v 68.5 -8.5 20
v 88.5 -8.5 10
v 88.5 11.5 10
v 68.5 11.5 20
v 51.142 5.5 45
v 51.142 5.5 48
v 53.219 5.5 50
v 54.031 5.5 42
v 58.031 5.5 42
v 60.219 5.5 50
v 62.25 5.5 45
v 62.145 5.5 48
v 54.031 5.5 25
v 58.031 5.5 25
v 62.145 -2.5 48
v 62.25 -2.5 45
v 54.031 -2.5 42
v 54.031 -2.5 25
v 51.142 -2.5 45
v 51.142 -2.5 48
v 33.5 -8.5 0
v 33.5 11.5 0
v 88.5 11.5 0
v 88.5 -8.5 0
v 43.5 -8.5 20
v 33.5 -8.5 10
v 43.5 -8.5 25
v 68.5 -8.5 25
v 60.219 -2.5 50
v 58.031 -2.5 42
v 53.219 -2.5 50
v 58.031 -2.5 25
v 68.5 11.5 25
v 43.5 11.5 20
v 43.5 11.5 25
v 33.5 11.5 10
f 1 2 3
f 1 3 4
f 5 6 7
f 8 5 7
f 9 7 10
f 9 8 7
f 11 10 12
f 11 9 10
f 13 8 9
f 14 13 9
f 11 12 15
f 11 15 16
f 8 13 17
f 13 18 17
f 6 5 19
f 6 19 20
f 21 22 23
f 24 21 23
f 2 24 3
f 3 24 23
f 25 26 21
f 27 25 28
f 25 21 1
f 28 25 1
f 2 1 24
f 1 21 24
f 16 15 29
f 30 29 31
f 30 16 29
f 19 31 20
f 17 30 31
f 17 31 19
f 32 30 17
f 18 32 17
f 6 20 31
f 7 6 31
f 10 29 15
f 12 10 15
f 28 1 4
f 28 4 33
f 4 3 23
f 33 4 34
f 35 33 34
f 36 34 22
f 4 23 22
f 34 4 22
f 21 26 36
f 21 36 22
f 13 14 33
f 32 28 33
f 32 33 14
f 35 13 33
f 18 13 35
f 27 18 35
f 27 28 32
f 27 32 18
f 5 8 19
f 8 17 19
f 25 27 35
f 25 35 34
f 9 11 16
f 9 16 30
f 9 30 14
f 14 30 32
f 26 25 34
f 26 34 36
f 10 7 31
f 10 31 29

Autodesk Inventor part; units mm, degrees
ref_plane "YZ Plane" through (0, 0, 0) normal (1, 0, 0) x (0, 1, 0)
ref_plane "XZ Plane" through (0, 0, 0) normal (0, 1, 0) x (-1, 0, 0)
ref_plane "XY Plane" through (0, 0, 0) normal (0, 0, 1) x (1, 0, 0)
sketch "Эскиз1" plane through (0, 0, 0) normal (0, 0, 1) x (1, 0, 0)
  arc A0 (113.5, 24) -> (93.5, 4) centre (113.5, 4) ccw projected
  arc A1 (93.5, -1) -> (113.5, -21) centre (113.5, -1) ccw projected
  line L0 (93.5, 4) -> (93.5, -1) projected
  line L1 (88.5, 11.5) -> (28.5, 11.5)
  line L2 (28.5, 11.5) -> (28.5, -8.5)
  line L3 (28.5, -8.5) -> (88.5, -8.5)
  line L4 (88.5, -8.5) -> (88.5, 11.5)
  line L5 (-123.5, 102) -> (-123.5, -102) projected
  line L6 (-123.5, -102) -> (123.5, -102) projected
  line L7 (123.5, -102) -> (123.5, -100.4305) projected
  line L8 (123.5, -100.4305) -> (123.5, 102) projected
  line L9 (123.5, 102) -> (-123.5, 102) projected
  point P0 (0, 0)
  point P1 (88.5, 1.5)
  point P2 (93.5, 1.5)
  dimension "d0" = 20
  dimension "d1" = 60
  dimension "d2" = 5
extrude "Выдавливание1" add sketch "Эскиз1" along normal blind 30 contours L4 L3 L2 L1
sketch "Эскиз2" plane through (28.5, -8.5, 0) normal (0, -1, 0) x (1, 0, 0)
  line L0 (0, 0) -> (60, 0) projected
  line L1 (60, 0) -> (60, 3.0763)
  line L2 (60, 3.0763) -> (60, 10)
  line L3 (60, 10) -> (40, 20)
  line L4 (40, 20) -> (40, 25)
  line L5 (40, 25) -> (15, 25)
  line L6 (15, 25) -> (15, 20)
  line L7 (15, 20) -> (5, 10)
  line L8 (5, 10) -> (5, 0)
  line L9 (60, 0) -> (60, 30) projected
  point P0 (-28.5, 0)
  dimension "d6" = 25
  dimension "d7" = 5
  dimension "d8" = 5
  dimension "d9" = 20
  dimension "d10" = 10
  dimension "d11" = 10
  dimension "d12" = 10
  dimension "d13" = 25
extrude "Выдавливание2" cut sketch "Эскиз2" against normal blind 30 keep common part
sketch "Эскиз3" plane through (43.5, -8.5, 25) normal (0, 0, 1) x (1, 0, 0)
  line L0 (5, 14) -> (20, 14)
  line L1 (20, 14) -> (20, 6)
  line L2 (20, 6) -> (5, 6)
  line L3 (5, 6) -> (5, 14)
  line L4 (25, 20) -> (0, 20) projected
  line L5 (0, 0) -> (0, 20) projected
  point P0 (-43.5, 8.5)
  dimension "d16" = 8
  dimension "d17" = 15
  dimension "d18" = 6
  dimension "d19" = 25
  dimension "d20" = 20
  dimension "d21" = 5
extrude "Выдавливание3" add sketch "Эскиз3" along normal blind 25
sketch "Эскиз4" plane through (48.5, -2.5, 25) normal (0, -1, 0) x (1, 0, 0)
  line L0 (15, 0) -> (0, 0) projected
  line L1 (5.5312, 0) -> (5.5312, 17)
  line L2 (5.5312, 17) -> (2.6422, 20)
  line L3 (2.6422, 20) -> (2.6422, 23)
  line L4 (2.6422, 23) -> (4.719, 25)
  line L5 (4.719, 25) -> (11.719, 25)
  line L6 (0, 25) -> (15, 25) projected
  line L7 (11.719, 25) -> (13.645, 23)
  line L8 (13.645, 23) -> (13.7498, 20)
  line L9 (13.7498, 20) -> (9.5312, 17)
  line L10 (9.5312, 17) -> (9.5312, 0)
  line L11 (-5, 0) -> (20, 0) projected
  line L12 (0, 0) -> (0, 25) projected
  line L13 (5.5312, 0) -> (9.5312, 0)
  line L14 (20, -5) -> (40, -15) projected
  line L15 (20, 0) -> (20, -5) projected
  line L16 (-5, 0) -> (20, 0) projected
  line L17 (-5, -5) -> (-5, 0) projected
  line L18 (-15, -15) -> (-5, -5) projected
  line L19 (-15, -25) -> (-15, -15) projected
  line L20 (-15, -25) -> (40, -25) projected
  line L21 (40, -25) -> (40, -15) projected
  point P0 (-48.5, -25)
  point P1 (9.5312, 0)
  dimension "d24" = 2
  dimension "d25" = 7
  dimension "d26" = 17
  dimension "d27" = 17
  dimension "d28" = 3
  dimension "d29" = 3
  dimension "d30" = 3
  dimension "d31" = 3
  dimension "d32" = 2
  dimension "d33" = 4
  dimension "d34" = 11.1076
  dimension "d35" = 2.6422
extrude "Выдавливание4" cut sketch "Эскиз4" against normal through all both and the other way through all contours L11 L15 L14 L21 L20 L19 L18 L17 L0 | L0 L1 L2 L3 L4 L5 L7 L8 L9 L10 keep common part
equation "\"d18\" = -0.5 * d16 + 0.5 * d20"
equation "\"d21\" = -0.5 * d17 + 0.5 * d19"
properties part number "ДИ 00.00.06"
